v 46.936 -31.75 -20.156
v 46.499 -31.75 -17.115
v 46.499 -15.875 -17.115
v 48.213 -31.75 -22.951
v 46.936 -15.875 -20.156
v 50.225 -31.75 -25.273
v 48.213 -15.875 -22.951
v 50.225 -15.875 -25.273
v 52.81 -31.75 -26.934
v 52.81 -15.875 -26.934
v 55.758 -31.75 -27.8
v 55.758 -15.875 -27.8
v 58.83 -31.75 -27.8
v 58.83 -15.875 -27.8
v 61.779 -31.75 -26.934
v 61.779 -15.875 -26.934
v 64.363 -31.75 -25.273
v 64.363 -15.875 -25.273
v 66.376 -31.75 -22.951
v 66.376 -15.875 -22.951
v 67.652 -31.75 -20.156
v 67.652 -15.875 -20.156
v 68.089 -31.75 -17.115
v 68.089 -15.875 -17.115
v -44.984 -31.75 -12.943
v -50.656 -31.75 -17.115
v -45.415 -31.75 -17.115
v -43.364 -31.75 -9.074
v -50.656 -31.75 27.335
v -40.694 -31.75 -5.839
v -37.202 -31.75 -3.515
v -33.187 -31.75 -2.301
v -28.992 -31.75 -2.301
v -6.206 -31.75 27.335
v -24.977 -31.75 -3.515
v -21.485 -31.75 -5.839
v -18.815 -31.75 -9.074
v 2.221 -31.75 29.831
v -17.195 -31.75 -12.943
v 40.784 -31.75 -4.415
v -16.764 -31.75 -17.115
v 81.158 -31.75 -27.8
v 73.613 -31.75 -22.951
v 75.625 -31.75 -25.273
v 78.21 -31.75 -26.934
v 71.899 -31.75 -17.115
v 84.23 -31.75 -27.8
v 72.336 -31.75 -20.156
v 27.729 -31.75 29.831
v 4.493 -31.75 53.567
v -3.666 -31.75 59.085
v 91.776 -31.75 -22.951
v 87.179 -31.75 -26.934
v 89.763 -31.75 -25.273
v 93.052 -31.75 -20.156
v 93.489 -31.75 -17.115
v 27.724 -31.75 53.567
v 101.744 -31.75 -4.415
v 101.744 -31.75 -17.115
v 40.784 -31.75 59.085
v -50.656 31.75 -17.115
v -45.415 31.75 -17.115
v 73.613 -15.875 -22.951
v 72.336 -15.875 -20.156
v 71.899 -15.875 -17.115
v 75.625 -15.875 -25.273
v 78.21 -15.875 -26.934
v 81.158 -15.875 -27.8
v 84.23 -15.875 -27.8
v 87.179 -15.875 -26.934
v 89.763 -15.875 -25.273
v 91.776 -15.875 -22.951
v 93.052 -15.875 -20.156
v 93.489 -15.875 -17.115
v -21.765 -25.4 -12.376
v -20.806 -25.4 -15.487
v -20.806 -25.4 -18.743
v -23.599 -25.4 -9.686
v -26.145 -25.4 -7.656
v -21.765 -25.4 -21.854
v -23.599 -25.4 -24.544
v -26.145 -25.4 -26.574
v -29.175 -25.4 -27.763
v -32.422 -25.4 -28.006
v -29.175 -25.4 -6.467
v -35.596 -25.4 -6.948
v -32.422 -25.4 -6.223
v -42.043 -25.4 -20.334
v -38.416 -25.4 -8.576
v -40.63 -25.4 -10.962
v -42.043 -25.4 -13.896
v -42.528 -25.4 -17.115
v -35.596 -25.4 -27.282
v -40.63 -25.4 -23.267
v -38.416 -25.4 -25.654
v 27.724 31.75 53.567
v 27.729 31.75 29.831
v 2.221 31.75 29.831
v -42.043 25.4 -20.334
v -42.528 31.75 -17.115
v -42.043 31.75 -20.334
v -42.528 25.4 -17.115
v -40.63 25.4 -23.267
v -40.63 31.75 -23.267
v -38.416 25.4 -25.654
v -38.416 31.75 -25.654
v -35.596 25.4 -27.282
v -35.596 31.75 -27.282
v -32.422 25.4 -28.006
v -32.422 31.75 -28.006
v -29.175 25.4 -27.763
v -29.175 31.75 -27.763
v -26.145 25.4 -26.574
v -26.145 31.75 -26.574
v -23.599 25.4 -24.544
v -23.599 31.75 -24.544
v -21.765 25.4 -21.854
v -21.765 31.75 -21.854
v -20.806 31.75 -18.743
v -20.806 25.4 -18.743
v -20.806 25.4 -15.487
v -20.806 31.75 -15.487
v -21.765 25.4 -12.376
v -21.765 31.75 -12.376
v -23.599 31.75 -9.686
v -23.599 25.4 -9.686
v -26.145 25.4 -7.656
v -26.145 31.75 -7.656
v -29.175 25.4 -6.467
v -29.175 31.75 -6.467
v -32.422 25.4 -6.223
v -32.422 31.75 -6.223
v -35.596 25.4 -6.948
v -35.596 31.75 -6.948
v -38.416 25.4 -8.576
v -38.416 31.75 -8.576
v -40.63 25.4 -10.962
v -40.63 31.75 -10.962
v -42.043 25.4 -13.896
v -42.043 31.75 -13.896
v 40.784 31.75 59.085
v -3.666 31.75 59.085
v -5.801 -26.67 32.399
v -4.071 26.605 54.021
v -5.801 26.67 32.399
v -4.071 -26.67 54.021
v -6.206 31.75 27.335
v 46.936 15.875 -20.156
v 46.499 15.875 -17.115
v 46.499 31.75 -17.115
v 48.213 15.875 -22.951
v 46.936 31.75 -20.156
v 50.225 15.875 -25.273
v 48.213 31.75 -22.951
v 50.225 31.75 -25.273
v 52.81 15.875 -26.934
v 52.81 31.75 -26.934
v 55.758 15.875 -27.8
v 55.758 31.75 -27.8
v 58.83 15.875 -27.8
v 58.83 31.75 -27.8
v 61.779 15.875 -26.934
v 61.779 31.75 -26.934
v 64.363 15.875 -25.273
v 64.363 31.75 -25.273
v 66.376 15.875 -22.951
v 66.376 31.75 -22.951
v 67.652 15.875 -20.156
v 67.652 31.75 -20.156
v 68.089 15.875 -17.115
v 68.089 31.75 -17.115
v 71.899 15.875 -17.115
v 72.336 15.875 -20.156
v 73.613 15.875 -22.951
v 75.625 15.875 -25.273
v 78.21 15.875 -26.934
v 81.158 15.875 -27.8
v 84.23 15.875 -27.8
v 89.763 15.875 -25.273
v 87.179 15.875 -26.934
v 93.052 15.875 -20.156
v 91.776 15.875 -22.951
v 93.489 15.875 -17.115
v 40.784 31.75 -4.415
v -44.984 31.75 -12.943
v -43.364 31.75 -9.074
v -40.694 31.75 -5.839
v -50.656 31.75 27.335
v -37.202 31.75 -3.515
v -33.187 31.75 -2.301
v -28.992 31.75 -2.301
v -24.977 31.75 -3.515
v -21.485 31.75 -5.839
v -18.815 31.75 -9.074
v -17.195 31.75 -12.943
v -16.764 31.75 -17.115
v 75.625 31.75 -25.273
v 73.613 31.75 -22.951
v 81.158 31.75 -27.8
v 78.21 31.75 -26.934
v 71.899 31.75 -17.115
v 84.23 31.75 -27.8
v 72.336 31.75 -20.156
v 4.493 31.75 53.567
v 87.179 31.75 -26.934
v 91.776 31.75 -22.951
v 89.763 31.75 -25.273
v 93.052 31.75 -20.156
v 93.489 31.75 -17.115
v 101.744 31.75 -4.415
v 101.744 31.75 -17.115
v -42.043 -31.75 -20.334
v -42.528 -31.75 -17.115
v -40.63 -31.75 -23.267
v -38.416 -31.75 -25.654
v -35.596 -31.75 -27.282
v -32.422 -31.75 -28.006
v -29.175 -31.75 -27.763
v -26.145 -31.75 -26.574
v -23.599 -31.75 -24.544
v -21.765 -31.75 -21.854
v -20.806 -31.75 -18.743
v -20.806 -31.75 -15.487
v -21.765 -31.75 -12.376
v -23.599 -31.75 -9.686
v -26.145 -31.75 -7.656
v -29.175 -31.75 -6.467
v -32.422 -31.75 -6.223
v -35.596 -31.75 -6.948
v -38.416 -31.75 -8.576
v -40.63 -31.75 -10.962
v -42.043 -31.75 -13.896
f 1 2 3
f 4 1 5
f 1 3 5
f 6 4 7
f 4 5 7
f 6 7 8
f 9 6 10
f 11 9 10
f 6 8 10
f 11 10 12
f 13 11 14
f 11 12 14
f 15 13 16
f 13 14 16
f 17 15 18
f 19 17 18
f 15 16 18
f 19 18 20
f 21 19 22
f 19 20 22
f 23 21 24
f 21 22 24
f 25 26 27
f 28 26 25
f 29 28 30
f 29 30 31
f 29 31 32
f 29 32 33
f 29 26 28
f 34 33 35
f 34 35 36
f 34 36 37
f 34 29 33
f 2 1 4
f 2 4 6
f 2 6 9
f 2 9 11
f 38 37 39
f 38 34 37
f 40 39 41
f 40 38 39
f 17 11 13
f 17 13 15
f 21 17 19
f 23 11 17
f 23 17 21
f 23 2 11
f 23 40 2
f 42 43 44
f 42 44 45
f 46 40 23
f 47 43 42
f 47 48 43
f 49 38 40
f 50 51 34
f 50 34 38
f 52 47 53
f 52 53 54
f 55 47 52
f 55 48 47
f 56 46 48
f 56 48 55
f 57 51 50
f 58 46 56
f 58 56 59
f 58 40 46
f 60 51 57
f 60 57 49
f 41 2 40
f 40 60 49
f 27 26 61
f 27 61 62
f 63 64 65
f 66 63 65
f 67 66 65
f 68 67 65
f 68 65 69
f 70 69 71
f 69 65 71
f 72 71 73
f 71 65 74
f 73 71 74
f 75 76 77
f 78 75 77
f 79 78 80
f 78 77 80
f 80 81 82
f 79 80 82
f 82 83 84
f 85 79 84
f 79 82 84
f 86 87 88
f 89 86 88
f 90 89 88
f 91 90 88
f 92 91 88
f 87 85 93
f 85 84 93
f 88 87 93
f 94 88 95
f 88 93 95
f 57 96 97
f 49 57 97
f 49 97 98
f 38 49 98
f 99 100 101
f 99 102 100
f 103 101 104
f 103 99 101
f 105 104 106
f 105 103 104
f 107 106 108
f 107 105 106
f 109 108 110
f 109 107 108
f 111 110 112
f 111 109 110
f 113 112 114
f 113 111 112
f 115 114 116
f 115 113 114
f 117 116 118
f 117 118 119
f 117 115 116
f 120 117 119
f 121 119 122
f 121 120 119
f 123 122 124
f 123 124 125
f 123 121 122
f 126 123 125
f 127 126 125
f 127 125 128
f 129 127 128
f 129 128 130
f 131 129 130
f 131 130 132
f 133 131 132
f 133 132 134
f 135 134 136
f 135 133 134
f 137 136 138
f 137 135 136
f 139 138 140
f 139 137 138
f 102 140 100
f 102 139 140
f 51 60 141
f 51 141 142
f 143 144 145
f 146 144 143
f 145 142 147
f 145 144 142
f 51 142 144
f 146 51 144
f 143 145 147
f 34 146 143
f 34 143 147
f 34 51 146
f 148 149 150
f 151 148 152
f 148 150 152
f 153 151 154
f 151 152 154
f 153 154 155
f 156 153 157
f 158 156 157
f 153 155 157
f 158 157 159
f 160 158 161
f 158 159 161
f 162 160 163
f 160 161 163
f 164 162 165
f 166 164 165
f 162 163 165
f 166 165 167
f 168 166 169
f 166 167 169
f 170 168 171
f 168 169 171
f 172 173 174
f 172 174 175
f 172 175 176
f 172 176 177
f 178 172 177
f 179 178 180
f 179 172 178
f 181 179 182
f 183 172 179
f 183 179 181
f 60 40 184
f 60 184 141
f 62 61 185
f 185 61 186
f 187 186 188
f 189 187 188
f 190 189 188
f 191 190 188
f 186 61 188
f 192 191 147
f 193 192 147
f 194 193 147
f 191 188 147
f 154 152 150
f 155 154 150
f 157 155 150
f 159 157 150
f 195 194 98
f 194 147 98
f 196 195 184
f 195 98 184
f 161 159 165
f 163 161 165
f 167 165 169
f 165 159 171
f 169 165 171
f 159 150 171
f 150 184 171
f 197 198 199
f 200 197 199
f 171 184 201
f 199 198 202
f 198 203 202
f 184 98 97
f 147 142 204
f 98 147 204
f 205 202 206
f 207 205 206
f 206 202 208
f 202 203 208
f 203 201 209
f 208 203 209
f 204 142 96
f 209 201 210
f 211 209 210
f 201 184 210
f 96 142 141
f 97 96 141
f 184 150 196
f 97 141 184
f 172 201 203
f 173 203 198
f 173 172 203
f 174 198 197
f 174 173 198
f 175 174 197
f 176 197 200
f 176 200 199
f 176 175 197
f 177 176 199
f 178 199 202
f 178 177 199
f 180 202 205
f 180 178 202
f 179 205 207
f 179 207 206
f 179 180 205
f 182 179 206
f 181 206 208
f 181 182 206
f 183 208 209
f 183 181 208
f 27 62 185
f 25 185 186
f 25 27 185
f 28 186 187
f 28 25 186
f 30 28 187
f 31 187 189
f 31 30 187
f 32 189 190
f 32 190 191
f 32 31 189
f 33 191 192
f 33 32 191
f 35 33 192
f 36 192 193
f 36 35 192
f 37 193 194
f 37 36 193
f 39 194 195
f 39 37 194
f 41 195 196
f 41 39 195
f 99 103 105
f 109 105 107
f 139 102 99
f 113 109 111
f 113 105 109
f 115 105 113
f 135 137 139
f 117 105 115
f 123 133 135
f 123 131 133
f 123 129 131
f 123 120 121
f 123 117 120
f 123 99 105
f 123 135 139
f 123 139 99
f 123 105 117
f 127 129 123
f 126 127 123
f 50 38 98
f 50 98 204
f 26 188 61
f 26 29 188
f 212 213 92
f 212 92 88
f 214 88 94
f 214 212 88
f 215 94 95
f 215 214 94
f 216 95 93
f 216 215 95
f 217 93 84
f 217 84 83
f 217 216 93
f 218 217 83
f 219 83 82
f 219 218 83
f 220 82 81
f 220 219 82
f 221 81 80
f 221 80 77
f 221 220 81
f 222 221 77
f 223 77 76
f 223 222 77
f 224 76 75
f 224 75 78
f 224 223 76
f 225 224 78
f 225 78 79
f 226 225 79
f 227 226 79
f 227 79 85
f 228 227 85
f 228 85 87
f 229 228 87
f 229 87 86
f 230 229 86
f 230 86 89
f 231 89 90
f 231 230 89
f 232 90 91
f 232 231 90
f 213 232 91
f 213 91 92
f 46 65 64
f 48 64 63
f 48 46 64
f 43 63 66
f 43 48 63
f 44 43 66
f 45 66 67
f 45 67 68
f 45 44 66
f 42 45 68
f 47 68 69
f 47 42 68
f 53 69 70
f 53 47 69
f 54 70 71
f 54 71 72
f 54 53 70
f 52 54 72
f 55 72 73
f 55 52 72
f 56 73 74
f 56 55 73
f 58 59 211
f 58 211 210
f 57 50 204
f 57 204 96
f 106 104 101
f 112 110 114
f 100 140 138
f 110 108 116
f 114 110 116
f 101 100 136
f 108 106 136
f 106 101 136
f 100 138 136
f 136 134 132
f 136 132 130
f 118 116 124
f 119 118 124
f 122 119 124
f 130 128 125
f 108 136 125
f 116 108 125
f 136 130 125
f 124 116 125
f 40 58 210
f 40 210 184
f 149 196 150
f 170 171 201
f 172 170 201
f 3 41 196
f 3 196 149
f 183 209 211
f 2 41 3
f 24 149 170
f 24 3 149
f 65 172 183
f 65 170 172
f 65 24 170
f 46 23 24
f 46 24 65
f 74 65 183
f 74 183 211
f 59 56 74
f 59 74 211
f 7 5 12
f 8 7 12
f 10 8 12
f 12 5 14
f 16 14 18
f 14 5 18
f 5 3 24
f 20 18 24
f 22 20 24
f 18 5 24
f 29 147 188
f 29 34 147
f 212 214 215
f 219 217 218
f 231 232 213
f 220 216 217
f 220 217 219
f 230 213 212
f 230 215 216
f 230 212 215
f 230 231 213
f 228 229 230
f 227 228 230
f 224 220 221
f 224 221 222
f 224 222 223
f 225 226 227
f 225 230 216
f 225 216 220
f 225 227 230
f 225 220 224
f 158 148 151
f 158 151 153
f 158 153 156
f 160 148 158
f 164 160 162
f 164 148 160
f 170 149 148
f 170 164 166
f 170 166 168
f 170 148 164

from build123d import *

# Parameters (mm, degrees)
F1_DEPTH = 31.75
F2_DEPTH = 31.75
F3_DEPTH = 25.4
F4_DEPTH = 25.4
F5_DEPTH = 15.875
F7_DEPTH = 25.4


with BuildPart() as f1:
    # F0 (on Front) → F1 (new body, symmetric)
    with BuildSketch(Plane.XZ):
        with BuildLine():
            Line((-50.6557935558, 27.335102257), (-50.6557935558, -17.114897743))
            Line((-50.6557935558, -17.114897743), (-45.4152002931, -17.114897743))
            ThreePointArc((-45.4152002931, -17.114897743), (-31.0896001756, -2.1471956478), (-16.7640000582, -17.114897743))
            Line((-16.7640000582, -17.114897743), (46.4992064442, -17.114897743))
            ThreePointArc((46.4992064442, -17.114897743), (57.2942064442, -6.319897743), (68.0892064442, -17.114897743))
            Line((68.0892064442, -17.114897743), (71.8992064442, -17.114897743))
            ThreePointArc((71.8992064442, -17.114897743), (82.6942064442, -6.319897743), (93.4892064442, -17.114897743))
            Line((93.4892064442, -17.114897743), (101.7442064442, -17.114897743))
            Line((101.7442064442, -17.114897743), (101.7442064442, -4.414897743))
            Line((101.7442064442, -4.414897743), (69.7991997004, -4.414897743))
            Line((69.7991997004, -4.414897743), (65.5320063233, -4.414897743))
            Line((65.5320063233, -4.414897743), (40.7842064442, -4.414897743))
            Line((40.7842064442, -4.414897743), (40.7842064442, 59.085102257))
            Line((40.7842064442, 59.085102257), (-3.6657935558, 59.085102257))
            Line((-3.6657935558, 59.085102257), (-6.2057935558, 27.335102257))
            Line((-6.2057935558, 27.335102257), (-50.6557935558, 27.335102257))
        make_face()
        Polygon((27.7291558257, 29.8314392567), (2.2207412403, 29.8314392567), (4.4933222234, 53.5672903061), (27.7241561562, 53.5672903061), align=None, mode=Mode.SUBTRACT)
        with BuildLine():
            ThreePointArc((68.0892064442, -17.114897743), (57.2942064442, -6.319897743), (46.4992064442, -17.114897743))
            Line((46.4992064442, -17.114897743), (68.0892064442, -17.114897743))
        make_face()
        with BuildLine():
            ThreePointArc((93.4892064442, -17.114897743), (82.6942064442, -6.319897743), (71.8992064442, -17.114897743))
            Line((71.8992064442, -17.114897743), (93.4892064442, -17.114897743))
        make_face()
    extrude(amount=F1_DEPTH, both=True)

    # F0 (on Front) → F2, piece 2 (join, symmetric)
    with BuildSketch(Plane.XZ):
        with BuildLine():
            Line((68.0892064442, -17.114897743), (46.4992064442, -17.114897743))
            ThreePointArc((46.4992064442, -17.114897743), (57.2942064442, -27.909897743), (68.0892064442, -17.114897743))
        make_face()
        with BuildLine():
            Line((93.4892064442, -17.114897743), (71.8992064442, -17.114897743))
            ThreePointArc((71.8992064442, -17.114897743), (82.6942064442, -27.909897743), (93.4892064442, -17.114897743))
        make_face()
    extrude(amount=F2_DEPTH, both=True)

    # F0 (on Front) → F5 (cut, symmetric)
    with BuildSketch(Plane.XZ):
        with BuildLine():
            Line((93.4892064442, -17.114897743), (71.8992064442, -17.114897743))
            ThreePointArc((71.8992064442, -17.114897743), (82.6942064442, -27.909897743), (93.4892064442, -17.114897743))
        make_face()
        with BuildLine():
            Line((68.0892064442, -17.114897743), (46.4992064442, -17.114897743))
            ThreePointArc((46.4992064442, -17.114897743), (57.2942064442, -27.909897743), (68.0892064442, -17.114897743))
        make_face()
    extrude(amount=F5_DEPTH, both=True, mode=Mode.SUBTRACT)

    # F6 (on face) → F7 (cut)
    with BuildSketch(Plane(origin=(-8.3392306601, 0, 0.6671384528), x_dir=(0, -1, 0), z_dir=(-0.9968152785, 0, 0.0797452223))):
        Polygon((26.67, 53.5246031417), (-26.6048397136, 53.5246031417), (-26.67, 31.8331651835), (26.67, 31.8331651835), align=None)
    extrude(amount=F7_DEPTH, mode=Mode.SUBTRACT)


with BuildPart() as f2:
    # F0 (on Front) → F2 (new body, symmetric)
    with BuildSketch(Plane.XZ):
        with BuildLine():
            ThreePointArc((-20.6837935558, -17.114897743), (-31.6057935558, -6.192897743), (-42.5277935558, -17.114897743))
            Line((-42.5277935558, -17.114897743), (-20.6837935558, -17.114897743))
        make_face()
        with BuildLine():
            Line((-20.6837935558, -17.114897743), (-42.5277935558, -17.114897743))
            ThreePointArc((-42.5277935558, -17.114897743), (-31.6057935558, -28.036897743), (-20.6837935558, -17.114897743))
        make_face()
    extrude(amount=F2_DEPTH, both=True)

    # F0 (on Front) → F3 (cut, symmetric)
    with BuildSketch(Plane.XZ):
        with BuildLine():
            Line((-20.6837935558, -17.114897743), (-42.5277935558, -17.114897743))
            ThreePointArc((-42.5277935558, -17.114897743), (-31.6057935558, -28.036897743), (-20.6837935558, -17.114897743))
        make_face()
    extrude(amount=F3_DEPTH, both=True, mode=Mode.SUBTRACT)

    # F4 (cut): a face of the model
    f4_faces = [f2.faces().sort_by_distance(p)[0] for p in [
        (-31.6057935558, 0, -17.114897743),
    ]]
    extrude(f4_faces, amount=-F4_DEPTH, mode=Mode.SUBTRACT)


solid = Compound([f1.part, f2.part])
